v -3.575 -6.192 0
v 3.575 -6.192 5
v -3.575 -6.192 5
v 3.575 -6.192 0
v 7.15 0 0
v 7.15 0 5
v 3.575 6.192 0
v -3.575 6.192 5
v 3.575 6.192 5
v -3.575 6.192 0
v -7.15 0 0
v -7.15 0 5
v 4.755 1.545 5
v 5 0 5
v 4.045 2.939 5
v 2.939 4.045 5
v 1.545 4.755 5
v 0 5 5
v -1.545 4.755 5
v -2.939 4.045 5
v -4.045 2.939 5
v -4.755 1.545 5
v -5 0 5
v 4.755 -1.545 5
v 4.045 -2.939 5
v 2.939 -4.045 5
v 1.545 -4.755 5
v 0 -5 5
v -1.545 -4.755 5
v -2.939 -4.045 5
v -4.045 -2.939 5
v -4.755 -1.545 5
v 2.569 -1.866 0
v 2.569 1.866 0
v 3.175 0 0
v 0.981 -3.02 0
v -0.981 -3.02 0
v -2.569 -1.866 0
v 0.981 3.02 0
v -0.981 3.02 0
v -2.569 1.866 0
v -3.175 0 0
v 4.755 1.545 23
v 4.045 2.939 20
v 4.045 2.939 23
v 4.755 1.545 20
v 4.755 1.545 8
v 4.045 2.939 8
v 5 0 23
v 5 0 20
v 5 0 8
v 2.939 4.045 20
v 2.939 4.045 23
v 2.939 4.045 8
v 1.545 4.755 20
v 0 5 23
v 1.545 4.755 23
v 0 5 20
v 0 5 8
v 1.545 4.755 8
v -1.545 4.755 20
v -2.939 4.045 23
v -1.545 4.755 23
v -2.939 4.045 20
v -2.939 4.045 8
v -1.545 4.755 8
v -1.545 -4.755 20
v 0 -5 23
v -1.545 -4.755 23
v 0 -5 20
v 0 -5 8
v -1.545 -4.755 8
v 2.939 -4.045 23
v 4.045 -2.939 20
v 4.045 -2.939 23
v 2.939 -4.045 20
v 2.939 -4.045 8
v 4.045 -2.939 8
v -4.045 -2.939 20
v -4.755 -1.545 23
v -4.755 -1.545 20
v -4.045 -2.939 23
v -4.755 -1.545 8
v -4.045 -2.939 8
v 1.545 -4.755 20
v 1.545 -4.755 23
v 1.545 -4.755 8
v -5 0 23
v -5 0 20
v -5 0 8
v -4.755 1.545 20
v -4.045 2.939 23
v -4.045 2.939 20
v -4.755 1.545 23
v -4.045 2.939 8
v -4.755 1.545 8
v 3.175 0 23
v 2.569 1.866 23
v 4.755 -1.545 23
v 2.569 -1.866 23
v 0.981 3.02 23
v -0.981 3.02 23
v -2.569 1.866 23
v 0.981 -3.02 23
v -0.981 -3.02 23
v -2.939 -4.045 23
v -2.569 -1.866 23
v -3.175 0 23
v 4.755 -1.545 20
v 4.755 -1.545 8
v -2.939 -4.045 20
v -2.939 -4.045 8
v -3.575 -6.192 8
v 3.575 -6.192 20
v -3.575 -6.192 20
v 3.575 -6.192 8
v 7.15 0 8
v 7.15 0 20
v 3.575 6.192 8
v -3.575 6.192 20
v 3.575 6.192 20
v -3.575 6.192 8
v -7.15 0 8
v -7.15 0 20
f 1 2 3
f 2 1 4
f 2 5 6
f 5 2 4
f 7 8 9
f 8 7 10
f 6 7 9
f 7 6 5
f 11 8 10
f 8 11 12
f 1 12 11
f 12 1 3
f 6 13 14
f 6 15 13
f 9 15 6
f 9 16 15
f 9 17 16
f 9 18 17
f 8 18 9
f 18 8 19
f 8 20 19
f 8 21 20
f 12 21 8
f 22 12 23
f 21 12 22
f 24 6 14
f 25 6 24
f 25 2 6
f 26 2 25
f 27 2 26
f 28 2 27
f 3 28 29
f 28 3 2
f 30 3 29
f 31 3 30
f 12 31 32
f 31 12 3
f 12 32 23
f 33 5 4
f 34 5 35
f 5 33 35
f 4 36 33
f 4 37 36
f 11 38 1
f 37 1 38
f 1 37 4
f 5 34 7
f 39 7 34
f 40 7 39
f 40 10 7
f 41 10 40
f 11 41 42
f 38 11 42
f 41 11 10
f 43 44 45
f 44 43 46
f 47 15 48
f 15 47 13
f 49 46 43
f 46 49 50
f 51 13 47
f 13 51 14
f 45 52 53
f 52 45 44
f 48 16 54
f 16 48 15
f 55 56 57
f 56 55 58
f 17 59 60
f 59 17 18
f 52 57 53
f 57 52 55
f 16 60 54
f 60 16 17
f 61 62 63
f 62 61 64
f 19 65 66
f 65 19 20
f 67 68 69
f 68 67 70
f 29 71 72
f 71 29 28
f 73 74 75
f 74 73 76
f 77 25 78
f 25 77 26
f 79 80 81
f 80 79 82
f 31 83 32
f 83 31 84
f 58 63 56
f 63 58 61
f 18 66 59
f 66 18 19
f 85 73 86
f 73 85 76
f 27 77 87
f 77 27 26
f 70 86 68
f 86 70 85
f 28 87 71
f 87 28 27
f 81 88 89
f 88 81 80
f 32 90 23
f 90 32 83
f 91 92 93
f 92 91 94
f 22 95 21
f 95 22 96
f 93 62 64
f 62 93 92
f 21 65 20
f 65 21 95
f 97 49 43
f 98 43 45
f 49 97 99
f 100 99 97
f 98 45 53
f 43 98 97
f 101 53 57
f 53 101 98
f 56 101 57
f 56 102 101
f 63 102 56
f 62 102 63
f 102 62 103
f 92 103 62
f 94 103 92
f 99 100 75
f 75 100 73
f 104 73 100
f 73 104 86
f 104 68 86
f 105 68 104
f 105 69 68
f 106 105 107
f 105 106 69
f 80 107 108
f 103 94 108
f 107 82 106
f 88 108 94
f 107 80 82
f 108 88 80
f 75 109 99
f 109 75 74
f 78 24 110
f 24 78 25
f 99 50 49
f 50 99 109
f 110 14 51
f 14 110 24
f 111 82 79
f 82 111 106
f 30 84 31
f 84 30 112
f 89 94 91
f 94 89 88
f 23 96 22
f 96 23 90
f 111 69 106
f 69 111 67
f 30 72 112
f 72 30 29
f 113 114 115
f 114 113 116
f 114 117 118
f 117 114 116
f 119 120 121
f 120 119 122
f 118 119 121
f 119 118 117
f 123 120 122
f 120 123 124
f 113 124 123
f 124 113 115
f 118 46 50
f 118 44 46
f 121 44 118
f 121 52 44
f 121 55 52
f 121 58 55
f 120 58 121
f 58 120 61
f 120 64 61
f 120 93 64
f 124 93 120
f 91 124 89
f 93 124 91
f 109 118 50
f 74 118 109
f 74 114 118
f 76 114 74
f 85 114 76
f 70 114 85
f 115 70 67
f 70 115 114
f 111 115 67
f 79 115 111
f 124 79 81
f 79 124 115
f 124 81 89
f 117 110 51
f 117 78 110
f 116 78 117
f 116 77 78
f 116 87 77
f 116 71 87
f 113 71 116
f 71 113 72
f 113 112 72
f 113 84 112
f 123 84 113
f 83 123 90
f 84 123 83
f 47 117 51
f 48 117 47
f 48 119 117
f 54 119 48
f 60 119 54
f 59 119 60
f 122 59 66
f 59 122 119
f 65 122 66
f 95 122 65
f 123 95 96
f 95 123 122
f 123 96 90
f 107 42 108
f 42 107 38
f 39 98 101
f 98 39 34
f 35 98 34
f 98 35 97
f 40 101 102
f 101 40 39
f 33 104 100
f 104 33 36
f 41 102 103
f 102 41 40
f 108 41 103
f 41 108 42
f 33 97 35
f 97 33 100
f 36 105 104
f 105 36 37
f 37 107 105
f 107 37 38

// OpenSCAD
DMC_4_4N_S();
module DMC_4_4N_S(){
    difference(){
        union(){
            cylinder(h=5,d=14.3,$fn=6);
            cylinder(h=23,d=10,$fn=20);
            translate([0,0,8])cylinder(h=12,d=14.3,$fn=6);
        }
        translate([0,0,-1])cylinder(h=25,d=6.35);
    }
}
